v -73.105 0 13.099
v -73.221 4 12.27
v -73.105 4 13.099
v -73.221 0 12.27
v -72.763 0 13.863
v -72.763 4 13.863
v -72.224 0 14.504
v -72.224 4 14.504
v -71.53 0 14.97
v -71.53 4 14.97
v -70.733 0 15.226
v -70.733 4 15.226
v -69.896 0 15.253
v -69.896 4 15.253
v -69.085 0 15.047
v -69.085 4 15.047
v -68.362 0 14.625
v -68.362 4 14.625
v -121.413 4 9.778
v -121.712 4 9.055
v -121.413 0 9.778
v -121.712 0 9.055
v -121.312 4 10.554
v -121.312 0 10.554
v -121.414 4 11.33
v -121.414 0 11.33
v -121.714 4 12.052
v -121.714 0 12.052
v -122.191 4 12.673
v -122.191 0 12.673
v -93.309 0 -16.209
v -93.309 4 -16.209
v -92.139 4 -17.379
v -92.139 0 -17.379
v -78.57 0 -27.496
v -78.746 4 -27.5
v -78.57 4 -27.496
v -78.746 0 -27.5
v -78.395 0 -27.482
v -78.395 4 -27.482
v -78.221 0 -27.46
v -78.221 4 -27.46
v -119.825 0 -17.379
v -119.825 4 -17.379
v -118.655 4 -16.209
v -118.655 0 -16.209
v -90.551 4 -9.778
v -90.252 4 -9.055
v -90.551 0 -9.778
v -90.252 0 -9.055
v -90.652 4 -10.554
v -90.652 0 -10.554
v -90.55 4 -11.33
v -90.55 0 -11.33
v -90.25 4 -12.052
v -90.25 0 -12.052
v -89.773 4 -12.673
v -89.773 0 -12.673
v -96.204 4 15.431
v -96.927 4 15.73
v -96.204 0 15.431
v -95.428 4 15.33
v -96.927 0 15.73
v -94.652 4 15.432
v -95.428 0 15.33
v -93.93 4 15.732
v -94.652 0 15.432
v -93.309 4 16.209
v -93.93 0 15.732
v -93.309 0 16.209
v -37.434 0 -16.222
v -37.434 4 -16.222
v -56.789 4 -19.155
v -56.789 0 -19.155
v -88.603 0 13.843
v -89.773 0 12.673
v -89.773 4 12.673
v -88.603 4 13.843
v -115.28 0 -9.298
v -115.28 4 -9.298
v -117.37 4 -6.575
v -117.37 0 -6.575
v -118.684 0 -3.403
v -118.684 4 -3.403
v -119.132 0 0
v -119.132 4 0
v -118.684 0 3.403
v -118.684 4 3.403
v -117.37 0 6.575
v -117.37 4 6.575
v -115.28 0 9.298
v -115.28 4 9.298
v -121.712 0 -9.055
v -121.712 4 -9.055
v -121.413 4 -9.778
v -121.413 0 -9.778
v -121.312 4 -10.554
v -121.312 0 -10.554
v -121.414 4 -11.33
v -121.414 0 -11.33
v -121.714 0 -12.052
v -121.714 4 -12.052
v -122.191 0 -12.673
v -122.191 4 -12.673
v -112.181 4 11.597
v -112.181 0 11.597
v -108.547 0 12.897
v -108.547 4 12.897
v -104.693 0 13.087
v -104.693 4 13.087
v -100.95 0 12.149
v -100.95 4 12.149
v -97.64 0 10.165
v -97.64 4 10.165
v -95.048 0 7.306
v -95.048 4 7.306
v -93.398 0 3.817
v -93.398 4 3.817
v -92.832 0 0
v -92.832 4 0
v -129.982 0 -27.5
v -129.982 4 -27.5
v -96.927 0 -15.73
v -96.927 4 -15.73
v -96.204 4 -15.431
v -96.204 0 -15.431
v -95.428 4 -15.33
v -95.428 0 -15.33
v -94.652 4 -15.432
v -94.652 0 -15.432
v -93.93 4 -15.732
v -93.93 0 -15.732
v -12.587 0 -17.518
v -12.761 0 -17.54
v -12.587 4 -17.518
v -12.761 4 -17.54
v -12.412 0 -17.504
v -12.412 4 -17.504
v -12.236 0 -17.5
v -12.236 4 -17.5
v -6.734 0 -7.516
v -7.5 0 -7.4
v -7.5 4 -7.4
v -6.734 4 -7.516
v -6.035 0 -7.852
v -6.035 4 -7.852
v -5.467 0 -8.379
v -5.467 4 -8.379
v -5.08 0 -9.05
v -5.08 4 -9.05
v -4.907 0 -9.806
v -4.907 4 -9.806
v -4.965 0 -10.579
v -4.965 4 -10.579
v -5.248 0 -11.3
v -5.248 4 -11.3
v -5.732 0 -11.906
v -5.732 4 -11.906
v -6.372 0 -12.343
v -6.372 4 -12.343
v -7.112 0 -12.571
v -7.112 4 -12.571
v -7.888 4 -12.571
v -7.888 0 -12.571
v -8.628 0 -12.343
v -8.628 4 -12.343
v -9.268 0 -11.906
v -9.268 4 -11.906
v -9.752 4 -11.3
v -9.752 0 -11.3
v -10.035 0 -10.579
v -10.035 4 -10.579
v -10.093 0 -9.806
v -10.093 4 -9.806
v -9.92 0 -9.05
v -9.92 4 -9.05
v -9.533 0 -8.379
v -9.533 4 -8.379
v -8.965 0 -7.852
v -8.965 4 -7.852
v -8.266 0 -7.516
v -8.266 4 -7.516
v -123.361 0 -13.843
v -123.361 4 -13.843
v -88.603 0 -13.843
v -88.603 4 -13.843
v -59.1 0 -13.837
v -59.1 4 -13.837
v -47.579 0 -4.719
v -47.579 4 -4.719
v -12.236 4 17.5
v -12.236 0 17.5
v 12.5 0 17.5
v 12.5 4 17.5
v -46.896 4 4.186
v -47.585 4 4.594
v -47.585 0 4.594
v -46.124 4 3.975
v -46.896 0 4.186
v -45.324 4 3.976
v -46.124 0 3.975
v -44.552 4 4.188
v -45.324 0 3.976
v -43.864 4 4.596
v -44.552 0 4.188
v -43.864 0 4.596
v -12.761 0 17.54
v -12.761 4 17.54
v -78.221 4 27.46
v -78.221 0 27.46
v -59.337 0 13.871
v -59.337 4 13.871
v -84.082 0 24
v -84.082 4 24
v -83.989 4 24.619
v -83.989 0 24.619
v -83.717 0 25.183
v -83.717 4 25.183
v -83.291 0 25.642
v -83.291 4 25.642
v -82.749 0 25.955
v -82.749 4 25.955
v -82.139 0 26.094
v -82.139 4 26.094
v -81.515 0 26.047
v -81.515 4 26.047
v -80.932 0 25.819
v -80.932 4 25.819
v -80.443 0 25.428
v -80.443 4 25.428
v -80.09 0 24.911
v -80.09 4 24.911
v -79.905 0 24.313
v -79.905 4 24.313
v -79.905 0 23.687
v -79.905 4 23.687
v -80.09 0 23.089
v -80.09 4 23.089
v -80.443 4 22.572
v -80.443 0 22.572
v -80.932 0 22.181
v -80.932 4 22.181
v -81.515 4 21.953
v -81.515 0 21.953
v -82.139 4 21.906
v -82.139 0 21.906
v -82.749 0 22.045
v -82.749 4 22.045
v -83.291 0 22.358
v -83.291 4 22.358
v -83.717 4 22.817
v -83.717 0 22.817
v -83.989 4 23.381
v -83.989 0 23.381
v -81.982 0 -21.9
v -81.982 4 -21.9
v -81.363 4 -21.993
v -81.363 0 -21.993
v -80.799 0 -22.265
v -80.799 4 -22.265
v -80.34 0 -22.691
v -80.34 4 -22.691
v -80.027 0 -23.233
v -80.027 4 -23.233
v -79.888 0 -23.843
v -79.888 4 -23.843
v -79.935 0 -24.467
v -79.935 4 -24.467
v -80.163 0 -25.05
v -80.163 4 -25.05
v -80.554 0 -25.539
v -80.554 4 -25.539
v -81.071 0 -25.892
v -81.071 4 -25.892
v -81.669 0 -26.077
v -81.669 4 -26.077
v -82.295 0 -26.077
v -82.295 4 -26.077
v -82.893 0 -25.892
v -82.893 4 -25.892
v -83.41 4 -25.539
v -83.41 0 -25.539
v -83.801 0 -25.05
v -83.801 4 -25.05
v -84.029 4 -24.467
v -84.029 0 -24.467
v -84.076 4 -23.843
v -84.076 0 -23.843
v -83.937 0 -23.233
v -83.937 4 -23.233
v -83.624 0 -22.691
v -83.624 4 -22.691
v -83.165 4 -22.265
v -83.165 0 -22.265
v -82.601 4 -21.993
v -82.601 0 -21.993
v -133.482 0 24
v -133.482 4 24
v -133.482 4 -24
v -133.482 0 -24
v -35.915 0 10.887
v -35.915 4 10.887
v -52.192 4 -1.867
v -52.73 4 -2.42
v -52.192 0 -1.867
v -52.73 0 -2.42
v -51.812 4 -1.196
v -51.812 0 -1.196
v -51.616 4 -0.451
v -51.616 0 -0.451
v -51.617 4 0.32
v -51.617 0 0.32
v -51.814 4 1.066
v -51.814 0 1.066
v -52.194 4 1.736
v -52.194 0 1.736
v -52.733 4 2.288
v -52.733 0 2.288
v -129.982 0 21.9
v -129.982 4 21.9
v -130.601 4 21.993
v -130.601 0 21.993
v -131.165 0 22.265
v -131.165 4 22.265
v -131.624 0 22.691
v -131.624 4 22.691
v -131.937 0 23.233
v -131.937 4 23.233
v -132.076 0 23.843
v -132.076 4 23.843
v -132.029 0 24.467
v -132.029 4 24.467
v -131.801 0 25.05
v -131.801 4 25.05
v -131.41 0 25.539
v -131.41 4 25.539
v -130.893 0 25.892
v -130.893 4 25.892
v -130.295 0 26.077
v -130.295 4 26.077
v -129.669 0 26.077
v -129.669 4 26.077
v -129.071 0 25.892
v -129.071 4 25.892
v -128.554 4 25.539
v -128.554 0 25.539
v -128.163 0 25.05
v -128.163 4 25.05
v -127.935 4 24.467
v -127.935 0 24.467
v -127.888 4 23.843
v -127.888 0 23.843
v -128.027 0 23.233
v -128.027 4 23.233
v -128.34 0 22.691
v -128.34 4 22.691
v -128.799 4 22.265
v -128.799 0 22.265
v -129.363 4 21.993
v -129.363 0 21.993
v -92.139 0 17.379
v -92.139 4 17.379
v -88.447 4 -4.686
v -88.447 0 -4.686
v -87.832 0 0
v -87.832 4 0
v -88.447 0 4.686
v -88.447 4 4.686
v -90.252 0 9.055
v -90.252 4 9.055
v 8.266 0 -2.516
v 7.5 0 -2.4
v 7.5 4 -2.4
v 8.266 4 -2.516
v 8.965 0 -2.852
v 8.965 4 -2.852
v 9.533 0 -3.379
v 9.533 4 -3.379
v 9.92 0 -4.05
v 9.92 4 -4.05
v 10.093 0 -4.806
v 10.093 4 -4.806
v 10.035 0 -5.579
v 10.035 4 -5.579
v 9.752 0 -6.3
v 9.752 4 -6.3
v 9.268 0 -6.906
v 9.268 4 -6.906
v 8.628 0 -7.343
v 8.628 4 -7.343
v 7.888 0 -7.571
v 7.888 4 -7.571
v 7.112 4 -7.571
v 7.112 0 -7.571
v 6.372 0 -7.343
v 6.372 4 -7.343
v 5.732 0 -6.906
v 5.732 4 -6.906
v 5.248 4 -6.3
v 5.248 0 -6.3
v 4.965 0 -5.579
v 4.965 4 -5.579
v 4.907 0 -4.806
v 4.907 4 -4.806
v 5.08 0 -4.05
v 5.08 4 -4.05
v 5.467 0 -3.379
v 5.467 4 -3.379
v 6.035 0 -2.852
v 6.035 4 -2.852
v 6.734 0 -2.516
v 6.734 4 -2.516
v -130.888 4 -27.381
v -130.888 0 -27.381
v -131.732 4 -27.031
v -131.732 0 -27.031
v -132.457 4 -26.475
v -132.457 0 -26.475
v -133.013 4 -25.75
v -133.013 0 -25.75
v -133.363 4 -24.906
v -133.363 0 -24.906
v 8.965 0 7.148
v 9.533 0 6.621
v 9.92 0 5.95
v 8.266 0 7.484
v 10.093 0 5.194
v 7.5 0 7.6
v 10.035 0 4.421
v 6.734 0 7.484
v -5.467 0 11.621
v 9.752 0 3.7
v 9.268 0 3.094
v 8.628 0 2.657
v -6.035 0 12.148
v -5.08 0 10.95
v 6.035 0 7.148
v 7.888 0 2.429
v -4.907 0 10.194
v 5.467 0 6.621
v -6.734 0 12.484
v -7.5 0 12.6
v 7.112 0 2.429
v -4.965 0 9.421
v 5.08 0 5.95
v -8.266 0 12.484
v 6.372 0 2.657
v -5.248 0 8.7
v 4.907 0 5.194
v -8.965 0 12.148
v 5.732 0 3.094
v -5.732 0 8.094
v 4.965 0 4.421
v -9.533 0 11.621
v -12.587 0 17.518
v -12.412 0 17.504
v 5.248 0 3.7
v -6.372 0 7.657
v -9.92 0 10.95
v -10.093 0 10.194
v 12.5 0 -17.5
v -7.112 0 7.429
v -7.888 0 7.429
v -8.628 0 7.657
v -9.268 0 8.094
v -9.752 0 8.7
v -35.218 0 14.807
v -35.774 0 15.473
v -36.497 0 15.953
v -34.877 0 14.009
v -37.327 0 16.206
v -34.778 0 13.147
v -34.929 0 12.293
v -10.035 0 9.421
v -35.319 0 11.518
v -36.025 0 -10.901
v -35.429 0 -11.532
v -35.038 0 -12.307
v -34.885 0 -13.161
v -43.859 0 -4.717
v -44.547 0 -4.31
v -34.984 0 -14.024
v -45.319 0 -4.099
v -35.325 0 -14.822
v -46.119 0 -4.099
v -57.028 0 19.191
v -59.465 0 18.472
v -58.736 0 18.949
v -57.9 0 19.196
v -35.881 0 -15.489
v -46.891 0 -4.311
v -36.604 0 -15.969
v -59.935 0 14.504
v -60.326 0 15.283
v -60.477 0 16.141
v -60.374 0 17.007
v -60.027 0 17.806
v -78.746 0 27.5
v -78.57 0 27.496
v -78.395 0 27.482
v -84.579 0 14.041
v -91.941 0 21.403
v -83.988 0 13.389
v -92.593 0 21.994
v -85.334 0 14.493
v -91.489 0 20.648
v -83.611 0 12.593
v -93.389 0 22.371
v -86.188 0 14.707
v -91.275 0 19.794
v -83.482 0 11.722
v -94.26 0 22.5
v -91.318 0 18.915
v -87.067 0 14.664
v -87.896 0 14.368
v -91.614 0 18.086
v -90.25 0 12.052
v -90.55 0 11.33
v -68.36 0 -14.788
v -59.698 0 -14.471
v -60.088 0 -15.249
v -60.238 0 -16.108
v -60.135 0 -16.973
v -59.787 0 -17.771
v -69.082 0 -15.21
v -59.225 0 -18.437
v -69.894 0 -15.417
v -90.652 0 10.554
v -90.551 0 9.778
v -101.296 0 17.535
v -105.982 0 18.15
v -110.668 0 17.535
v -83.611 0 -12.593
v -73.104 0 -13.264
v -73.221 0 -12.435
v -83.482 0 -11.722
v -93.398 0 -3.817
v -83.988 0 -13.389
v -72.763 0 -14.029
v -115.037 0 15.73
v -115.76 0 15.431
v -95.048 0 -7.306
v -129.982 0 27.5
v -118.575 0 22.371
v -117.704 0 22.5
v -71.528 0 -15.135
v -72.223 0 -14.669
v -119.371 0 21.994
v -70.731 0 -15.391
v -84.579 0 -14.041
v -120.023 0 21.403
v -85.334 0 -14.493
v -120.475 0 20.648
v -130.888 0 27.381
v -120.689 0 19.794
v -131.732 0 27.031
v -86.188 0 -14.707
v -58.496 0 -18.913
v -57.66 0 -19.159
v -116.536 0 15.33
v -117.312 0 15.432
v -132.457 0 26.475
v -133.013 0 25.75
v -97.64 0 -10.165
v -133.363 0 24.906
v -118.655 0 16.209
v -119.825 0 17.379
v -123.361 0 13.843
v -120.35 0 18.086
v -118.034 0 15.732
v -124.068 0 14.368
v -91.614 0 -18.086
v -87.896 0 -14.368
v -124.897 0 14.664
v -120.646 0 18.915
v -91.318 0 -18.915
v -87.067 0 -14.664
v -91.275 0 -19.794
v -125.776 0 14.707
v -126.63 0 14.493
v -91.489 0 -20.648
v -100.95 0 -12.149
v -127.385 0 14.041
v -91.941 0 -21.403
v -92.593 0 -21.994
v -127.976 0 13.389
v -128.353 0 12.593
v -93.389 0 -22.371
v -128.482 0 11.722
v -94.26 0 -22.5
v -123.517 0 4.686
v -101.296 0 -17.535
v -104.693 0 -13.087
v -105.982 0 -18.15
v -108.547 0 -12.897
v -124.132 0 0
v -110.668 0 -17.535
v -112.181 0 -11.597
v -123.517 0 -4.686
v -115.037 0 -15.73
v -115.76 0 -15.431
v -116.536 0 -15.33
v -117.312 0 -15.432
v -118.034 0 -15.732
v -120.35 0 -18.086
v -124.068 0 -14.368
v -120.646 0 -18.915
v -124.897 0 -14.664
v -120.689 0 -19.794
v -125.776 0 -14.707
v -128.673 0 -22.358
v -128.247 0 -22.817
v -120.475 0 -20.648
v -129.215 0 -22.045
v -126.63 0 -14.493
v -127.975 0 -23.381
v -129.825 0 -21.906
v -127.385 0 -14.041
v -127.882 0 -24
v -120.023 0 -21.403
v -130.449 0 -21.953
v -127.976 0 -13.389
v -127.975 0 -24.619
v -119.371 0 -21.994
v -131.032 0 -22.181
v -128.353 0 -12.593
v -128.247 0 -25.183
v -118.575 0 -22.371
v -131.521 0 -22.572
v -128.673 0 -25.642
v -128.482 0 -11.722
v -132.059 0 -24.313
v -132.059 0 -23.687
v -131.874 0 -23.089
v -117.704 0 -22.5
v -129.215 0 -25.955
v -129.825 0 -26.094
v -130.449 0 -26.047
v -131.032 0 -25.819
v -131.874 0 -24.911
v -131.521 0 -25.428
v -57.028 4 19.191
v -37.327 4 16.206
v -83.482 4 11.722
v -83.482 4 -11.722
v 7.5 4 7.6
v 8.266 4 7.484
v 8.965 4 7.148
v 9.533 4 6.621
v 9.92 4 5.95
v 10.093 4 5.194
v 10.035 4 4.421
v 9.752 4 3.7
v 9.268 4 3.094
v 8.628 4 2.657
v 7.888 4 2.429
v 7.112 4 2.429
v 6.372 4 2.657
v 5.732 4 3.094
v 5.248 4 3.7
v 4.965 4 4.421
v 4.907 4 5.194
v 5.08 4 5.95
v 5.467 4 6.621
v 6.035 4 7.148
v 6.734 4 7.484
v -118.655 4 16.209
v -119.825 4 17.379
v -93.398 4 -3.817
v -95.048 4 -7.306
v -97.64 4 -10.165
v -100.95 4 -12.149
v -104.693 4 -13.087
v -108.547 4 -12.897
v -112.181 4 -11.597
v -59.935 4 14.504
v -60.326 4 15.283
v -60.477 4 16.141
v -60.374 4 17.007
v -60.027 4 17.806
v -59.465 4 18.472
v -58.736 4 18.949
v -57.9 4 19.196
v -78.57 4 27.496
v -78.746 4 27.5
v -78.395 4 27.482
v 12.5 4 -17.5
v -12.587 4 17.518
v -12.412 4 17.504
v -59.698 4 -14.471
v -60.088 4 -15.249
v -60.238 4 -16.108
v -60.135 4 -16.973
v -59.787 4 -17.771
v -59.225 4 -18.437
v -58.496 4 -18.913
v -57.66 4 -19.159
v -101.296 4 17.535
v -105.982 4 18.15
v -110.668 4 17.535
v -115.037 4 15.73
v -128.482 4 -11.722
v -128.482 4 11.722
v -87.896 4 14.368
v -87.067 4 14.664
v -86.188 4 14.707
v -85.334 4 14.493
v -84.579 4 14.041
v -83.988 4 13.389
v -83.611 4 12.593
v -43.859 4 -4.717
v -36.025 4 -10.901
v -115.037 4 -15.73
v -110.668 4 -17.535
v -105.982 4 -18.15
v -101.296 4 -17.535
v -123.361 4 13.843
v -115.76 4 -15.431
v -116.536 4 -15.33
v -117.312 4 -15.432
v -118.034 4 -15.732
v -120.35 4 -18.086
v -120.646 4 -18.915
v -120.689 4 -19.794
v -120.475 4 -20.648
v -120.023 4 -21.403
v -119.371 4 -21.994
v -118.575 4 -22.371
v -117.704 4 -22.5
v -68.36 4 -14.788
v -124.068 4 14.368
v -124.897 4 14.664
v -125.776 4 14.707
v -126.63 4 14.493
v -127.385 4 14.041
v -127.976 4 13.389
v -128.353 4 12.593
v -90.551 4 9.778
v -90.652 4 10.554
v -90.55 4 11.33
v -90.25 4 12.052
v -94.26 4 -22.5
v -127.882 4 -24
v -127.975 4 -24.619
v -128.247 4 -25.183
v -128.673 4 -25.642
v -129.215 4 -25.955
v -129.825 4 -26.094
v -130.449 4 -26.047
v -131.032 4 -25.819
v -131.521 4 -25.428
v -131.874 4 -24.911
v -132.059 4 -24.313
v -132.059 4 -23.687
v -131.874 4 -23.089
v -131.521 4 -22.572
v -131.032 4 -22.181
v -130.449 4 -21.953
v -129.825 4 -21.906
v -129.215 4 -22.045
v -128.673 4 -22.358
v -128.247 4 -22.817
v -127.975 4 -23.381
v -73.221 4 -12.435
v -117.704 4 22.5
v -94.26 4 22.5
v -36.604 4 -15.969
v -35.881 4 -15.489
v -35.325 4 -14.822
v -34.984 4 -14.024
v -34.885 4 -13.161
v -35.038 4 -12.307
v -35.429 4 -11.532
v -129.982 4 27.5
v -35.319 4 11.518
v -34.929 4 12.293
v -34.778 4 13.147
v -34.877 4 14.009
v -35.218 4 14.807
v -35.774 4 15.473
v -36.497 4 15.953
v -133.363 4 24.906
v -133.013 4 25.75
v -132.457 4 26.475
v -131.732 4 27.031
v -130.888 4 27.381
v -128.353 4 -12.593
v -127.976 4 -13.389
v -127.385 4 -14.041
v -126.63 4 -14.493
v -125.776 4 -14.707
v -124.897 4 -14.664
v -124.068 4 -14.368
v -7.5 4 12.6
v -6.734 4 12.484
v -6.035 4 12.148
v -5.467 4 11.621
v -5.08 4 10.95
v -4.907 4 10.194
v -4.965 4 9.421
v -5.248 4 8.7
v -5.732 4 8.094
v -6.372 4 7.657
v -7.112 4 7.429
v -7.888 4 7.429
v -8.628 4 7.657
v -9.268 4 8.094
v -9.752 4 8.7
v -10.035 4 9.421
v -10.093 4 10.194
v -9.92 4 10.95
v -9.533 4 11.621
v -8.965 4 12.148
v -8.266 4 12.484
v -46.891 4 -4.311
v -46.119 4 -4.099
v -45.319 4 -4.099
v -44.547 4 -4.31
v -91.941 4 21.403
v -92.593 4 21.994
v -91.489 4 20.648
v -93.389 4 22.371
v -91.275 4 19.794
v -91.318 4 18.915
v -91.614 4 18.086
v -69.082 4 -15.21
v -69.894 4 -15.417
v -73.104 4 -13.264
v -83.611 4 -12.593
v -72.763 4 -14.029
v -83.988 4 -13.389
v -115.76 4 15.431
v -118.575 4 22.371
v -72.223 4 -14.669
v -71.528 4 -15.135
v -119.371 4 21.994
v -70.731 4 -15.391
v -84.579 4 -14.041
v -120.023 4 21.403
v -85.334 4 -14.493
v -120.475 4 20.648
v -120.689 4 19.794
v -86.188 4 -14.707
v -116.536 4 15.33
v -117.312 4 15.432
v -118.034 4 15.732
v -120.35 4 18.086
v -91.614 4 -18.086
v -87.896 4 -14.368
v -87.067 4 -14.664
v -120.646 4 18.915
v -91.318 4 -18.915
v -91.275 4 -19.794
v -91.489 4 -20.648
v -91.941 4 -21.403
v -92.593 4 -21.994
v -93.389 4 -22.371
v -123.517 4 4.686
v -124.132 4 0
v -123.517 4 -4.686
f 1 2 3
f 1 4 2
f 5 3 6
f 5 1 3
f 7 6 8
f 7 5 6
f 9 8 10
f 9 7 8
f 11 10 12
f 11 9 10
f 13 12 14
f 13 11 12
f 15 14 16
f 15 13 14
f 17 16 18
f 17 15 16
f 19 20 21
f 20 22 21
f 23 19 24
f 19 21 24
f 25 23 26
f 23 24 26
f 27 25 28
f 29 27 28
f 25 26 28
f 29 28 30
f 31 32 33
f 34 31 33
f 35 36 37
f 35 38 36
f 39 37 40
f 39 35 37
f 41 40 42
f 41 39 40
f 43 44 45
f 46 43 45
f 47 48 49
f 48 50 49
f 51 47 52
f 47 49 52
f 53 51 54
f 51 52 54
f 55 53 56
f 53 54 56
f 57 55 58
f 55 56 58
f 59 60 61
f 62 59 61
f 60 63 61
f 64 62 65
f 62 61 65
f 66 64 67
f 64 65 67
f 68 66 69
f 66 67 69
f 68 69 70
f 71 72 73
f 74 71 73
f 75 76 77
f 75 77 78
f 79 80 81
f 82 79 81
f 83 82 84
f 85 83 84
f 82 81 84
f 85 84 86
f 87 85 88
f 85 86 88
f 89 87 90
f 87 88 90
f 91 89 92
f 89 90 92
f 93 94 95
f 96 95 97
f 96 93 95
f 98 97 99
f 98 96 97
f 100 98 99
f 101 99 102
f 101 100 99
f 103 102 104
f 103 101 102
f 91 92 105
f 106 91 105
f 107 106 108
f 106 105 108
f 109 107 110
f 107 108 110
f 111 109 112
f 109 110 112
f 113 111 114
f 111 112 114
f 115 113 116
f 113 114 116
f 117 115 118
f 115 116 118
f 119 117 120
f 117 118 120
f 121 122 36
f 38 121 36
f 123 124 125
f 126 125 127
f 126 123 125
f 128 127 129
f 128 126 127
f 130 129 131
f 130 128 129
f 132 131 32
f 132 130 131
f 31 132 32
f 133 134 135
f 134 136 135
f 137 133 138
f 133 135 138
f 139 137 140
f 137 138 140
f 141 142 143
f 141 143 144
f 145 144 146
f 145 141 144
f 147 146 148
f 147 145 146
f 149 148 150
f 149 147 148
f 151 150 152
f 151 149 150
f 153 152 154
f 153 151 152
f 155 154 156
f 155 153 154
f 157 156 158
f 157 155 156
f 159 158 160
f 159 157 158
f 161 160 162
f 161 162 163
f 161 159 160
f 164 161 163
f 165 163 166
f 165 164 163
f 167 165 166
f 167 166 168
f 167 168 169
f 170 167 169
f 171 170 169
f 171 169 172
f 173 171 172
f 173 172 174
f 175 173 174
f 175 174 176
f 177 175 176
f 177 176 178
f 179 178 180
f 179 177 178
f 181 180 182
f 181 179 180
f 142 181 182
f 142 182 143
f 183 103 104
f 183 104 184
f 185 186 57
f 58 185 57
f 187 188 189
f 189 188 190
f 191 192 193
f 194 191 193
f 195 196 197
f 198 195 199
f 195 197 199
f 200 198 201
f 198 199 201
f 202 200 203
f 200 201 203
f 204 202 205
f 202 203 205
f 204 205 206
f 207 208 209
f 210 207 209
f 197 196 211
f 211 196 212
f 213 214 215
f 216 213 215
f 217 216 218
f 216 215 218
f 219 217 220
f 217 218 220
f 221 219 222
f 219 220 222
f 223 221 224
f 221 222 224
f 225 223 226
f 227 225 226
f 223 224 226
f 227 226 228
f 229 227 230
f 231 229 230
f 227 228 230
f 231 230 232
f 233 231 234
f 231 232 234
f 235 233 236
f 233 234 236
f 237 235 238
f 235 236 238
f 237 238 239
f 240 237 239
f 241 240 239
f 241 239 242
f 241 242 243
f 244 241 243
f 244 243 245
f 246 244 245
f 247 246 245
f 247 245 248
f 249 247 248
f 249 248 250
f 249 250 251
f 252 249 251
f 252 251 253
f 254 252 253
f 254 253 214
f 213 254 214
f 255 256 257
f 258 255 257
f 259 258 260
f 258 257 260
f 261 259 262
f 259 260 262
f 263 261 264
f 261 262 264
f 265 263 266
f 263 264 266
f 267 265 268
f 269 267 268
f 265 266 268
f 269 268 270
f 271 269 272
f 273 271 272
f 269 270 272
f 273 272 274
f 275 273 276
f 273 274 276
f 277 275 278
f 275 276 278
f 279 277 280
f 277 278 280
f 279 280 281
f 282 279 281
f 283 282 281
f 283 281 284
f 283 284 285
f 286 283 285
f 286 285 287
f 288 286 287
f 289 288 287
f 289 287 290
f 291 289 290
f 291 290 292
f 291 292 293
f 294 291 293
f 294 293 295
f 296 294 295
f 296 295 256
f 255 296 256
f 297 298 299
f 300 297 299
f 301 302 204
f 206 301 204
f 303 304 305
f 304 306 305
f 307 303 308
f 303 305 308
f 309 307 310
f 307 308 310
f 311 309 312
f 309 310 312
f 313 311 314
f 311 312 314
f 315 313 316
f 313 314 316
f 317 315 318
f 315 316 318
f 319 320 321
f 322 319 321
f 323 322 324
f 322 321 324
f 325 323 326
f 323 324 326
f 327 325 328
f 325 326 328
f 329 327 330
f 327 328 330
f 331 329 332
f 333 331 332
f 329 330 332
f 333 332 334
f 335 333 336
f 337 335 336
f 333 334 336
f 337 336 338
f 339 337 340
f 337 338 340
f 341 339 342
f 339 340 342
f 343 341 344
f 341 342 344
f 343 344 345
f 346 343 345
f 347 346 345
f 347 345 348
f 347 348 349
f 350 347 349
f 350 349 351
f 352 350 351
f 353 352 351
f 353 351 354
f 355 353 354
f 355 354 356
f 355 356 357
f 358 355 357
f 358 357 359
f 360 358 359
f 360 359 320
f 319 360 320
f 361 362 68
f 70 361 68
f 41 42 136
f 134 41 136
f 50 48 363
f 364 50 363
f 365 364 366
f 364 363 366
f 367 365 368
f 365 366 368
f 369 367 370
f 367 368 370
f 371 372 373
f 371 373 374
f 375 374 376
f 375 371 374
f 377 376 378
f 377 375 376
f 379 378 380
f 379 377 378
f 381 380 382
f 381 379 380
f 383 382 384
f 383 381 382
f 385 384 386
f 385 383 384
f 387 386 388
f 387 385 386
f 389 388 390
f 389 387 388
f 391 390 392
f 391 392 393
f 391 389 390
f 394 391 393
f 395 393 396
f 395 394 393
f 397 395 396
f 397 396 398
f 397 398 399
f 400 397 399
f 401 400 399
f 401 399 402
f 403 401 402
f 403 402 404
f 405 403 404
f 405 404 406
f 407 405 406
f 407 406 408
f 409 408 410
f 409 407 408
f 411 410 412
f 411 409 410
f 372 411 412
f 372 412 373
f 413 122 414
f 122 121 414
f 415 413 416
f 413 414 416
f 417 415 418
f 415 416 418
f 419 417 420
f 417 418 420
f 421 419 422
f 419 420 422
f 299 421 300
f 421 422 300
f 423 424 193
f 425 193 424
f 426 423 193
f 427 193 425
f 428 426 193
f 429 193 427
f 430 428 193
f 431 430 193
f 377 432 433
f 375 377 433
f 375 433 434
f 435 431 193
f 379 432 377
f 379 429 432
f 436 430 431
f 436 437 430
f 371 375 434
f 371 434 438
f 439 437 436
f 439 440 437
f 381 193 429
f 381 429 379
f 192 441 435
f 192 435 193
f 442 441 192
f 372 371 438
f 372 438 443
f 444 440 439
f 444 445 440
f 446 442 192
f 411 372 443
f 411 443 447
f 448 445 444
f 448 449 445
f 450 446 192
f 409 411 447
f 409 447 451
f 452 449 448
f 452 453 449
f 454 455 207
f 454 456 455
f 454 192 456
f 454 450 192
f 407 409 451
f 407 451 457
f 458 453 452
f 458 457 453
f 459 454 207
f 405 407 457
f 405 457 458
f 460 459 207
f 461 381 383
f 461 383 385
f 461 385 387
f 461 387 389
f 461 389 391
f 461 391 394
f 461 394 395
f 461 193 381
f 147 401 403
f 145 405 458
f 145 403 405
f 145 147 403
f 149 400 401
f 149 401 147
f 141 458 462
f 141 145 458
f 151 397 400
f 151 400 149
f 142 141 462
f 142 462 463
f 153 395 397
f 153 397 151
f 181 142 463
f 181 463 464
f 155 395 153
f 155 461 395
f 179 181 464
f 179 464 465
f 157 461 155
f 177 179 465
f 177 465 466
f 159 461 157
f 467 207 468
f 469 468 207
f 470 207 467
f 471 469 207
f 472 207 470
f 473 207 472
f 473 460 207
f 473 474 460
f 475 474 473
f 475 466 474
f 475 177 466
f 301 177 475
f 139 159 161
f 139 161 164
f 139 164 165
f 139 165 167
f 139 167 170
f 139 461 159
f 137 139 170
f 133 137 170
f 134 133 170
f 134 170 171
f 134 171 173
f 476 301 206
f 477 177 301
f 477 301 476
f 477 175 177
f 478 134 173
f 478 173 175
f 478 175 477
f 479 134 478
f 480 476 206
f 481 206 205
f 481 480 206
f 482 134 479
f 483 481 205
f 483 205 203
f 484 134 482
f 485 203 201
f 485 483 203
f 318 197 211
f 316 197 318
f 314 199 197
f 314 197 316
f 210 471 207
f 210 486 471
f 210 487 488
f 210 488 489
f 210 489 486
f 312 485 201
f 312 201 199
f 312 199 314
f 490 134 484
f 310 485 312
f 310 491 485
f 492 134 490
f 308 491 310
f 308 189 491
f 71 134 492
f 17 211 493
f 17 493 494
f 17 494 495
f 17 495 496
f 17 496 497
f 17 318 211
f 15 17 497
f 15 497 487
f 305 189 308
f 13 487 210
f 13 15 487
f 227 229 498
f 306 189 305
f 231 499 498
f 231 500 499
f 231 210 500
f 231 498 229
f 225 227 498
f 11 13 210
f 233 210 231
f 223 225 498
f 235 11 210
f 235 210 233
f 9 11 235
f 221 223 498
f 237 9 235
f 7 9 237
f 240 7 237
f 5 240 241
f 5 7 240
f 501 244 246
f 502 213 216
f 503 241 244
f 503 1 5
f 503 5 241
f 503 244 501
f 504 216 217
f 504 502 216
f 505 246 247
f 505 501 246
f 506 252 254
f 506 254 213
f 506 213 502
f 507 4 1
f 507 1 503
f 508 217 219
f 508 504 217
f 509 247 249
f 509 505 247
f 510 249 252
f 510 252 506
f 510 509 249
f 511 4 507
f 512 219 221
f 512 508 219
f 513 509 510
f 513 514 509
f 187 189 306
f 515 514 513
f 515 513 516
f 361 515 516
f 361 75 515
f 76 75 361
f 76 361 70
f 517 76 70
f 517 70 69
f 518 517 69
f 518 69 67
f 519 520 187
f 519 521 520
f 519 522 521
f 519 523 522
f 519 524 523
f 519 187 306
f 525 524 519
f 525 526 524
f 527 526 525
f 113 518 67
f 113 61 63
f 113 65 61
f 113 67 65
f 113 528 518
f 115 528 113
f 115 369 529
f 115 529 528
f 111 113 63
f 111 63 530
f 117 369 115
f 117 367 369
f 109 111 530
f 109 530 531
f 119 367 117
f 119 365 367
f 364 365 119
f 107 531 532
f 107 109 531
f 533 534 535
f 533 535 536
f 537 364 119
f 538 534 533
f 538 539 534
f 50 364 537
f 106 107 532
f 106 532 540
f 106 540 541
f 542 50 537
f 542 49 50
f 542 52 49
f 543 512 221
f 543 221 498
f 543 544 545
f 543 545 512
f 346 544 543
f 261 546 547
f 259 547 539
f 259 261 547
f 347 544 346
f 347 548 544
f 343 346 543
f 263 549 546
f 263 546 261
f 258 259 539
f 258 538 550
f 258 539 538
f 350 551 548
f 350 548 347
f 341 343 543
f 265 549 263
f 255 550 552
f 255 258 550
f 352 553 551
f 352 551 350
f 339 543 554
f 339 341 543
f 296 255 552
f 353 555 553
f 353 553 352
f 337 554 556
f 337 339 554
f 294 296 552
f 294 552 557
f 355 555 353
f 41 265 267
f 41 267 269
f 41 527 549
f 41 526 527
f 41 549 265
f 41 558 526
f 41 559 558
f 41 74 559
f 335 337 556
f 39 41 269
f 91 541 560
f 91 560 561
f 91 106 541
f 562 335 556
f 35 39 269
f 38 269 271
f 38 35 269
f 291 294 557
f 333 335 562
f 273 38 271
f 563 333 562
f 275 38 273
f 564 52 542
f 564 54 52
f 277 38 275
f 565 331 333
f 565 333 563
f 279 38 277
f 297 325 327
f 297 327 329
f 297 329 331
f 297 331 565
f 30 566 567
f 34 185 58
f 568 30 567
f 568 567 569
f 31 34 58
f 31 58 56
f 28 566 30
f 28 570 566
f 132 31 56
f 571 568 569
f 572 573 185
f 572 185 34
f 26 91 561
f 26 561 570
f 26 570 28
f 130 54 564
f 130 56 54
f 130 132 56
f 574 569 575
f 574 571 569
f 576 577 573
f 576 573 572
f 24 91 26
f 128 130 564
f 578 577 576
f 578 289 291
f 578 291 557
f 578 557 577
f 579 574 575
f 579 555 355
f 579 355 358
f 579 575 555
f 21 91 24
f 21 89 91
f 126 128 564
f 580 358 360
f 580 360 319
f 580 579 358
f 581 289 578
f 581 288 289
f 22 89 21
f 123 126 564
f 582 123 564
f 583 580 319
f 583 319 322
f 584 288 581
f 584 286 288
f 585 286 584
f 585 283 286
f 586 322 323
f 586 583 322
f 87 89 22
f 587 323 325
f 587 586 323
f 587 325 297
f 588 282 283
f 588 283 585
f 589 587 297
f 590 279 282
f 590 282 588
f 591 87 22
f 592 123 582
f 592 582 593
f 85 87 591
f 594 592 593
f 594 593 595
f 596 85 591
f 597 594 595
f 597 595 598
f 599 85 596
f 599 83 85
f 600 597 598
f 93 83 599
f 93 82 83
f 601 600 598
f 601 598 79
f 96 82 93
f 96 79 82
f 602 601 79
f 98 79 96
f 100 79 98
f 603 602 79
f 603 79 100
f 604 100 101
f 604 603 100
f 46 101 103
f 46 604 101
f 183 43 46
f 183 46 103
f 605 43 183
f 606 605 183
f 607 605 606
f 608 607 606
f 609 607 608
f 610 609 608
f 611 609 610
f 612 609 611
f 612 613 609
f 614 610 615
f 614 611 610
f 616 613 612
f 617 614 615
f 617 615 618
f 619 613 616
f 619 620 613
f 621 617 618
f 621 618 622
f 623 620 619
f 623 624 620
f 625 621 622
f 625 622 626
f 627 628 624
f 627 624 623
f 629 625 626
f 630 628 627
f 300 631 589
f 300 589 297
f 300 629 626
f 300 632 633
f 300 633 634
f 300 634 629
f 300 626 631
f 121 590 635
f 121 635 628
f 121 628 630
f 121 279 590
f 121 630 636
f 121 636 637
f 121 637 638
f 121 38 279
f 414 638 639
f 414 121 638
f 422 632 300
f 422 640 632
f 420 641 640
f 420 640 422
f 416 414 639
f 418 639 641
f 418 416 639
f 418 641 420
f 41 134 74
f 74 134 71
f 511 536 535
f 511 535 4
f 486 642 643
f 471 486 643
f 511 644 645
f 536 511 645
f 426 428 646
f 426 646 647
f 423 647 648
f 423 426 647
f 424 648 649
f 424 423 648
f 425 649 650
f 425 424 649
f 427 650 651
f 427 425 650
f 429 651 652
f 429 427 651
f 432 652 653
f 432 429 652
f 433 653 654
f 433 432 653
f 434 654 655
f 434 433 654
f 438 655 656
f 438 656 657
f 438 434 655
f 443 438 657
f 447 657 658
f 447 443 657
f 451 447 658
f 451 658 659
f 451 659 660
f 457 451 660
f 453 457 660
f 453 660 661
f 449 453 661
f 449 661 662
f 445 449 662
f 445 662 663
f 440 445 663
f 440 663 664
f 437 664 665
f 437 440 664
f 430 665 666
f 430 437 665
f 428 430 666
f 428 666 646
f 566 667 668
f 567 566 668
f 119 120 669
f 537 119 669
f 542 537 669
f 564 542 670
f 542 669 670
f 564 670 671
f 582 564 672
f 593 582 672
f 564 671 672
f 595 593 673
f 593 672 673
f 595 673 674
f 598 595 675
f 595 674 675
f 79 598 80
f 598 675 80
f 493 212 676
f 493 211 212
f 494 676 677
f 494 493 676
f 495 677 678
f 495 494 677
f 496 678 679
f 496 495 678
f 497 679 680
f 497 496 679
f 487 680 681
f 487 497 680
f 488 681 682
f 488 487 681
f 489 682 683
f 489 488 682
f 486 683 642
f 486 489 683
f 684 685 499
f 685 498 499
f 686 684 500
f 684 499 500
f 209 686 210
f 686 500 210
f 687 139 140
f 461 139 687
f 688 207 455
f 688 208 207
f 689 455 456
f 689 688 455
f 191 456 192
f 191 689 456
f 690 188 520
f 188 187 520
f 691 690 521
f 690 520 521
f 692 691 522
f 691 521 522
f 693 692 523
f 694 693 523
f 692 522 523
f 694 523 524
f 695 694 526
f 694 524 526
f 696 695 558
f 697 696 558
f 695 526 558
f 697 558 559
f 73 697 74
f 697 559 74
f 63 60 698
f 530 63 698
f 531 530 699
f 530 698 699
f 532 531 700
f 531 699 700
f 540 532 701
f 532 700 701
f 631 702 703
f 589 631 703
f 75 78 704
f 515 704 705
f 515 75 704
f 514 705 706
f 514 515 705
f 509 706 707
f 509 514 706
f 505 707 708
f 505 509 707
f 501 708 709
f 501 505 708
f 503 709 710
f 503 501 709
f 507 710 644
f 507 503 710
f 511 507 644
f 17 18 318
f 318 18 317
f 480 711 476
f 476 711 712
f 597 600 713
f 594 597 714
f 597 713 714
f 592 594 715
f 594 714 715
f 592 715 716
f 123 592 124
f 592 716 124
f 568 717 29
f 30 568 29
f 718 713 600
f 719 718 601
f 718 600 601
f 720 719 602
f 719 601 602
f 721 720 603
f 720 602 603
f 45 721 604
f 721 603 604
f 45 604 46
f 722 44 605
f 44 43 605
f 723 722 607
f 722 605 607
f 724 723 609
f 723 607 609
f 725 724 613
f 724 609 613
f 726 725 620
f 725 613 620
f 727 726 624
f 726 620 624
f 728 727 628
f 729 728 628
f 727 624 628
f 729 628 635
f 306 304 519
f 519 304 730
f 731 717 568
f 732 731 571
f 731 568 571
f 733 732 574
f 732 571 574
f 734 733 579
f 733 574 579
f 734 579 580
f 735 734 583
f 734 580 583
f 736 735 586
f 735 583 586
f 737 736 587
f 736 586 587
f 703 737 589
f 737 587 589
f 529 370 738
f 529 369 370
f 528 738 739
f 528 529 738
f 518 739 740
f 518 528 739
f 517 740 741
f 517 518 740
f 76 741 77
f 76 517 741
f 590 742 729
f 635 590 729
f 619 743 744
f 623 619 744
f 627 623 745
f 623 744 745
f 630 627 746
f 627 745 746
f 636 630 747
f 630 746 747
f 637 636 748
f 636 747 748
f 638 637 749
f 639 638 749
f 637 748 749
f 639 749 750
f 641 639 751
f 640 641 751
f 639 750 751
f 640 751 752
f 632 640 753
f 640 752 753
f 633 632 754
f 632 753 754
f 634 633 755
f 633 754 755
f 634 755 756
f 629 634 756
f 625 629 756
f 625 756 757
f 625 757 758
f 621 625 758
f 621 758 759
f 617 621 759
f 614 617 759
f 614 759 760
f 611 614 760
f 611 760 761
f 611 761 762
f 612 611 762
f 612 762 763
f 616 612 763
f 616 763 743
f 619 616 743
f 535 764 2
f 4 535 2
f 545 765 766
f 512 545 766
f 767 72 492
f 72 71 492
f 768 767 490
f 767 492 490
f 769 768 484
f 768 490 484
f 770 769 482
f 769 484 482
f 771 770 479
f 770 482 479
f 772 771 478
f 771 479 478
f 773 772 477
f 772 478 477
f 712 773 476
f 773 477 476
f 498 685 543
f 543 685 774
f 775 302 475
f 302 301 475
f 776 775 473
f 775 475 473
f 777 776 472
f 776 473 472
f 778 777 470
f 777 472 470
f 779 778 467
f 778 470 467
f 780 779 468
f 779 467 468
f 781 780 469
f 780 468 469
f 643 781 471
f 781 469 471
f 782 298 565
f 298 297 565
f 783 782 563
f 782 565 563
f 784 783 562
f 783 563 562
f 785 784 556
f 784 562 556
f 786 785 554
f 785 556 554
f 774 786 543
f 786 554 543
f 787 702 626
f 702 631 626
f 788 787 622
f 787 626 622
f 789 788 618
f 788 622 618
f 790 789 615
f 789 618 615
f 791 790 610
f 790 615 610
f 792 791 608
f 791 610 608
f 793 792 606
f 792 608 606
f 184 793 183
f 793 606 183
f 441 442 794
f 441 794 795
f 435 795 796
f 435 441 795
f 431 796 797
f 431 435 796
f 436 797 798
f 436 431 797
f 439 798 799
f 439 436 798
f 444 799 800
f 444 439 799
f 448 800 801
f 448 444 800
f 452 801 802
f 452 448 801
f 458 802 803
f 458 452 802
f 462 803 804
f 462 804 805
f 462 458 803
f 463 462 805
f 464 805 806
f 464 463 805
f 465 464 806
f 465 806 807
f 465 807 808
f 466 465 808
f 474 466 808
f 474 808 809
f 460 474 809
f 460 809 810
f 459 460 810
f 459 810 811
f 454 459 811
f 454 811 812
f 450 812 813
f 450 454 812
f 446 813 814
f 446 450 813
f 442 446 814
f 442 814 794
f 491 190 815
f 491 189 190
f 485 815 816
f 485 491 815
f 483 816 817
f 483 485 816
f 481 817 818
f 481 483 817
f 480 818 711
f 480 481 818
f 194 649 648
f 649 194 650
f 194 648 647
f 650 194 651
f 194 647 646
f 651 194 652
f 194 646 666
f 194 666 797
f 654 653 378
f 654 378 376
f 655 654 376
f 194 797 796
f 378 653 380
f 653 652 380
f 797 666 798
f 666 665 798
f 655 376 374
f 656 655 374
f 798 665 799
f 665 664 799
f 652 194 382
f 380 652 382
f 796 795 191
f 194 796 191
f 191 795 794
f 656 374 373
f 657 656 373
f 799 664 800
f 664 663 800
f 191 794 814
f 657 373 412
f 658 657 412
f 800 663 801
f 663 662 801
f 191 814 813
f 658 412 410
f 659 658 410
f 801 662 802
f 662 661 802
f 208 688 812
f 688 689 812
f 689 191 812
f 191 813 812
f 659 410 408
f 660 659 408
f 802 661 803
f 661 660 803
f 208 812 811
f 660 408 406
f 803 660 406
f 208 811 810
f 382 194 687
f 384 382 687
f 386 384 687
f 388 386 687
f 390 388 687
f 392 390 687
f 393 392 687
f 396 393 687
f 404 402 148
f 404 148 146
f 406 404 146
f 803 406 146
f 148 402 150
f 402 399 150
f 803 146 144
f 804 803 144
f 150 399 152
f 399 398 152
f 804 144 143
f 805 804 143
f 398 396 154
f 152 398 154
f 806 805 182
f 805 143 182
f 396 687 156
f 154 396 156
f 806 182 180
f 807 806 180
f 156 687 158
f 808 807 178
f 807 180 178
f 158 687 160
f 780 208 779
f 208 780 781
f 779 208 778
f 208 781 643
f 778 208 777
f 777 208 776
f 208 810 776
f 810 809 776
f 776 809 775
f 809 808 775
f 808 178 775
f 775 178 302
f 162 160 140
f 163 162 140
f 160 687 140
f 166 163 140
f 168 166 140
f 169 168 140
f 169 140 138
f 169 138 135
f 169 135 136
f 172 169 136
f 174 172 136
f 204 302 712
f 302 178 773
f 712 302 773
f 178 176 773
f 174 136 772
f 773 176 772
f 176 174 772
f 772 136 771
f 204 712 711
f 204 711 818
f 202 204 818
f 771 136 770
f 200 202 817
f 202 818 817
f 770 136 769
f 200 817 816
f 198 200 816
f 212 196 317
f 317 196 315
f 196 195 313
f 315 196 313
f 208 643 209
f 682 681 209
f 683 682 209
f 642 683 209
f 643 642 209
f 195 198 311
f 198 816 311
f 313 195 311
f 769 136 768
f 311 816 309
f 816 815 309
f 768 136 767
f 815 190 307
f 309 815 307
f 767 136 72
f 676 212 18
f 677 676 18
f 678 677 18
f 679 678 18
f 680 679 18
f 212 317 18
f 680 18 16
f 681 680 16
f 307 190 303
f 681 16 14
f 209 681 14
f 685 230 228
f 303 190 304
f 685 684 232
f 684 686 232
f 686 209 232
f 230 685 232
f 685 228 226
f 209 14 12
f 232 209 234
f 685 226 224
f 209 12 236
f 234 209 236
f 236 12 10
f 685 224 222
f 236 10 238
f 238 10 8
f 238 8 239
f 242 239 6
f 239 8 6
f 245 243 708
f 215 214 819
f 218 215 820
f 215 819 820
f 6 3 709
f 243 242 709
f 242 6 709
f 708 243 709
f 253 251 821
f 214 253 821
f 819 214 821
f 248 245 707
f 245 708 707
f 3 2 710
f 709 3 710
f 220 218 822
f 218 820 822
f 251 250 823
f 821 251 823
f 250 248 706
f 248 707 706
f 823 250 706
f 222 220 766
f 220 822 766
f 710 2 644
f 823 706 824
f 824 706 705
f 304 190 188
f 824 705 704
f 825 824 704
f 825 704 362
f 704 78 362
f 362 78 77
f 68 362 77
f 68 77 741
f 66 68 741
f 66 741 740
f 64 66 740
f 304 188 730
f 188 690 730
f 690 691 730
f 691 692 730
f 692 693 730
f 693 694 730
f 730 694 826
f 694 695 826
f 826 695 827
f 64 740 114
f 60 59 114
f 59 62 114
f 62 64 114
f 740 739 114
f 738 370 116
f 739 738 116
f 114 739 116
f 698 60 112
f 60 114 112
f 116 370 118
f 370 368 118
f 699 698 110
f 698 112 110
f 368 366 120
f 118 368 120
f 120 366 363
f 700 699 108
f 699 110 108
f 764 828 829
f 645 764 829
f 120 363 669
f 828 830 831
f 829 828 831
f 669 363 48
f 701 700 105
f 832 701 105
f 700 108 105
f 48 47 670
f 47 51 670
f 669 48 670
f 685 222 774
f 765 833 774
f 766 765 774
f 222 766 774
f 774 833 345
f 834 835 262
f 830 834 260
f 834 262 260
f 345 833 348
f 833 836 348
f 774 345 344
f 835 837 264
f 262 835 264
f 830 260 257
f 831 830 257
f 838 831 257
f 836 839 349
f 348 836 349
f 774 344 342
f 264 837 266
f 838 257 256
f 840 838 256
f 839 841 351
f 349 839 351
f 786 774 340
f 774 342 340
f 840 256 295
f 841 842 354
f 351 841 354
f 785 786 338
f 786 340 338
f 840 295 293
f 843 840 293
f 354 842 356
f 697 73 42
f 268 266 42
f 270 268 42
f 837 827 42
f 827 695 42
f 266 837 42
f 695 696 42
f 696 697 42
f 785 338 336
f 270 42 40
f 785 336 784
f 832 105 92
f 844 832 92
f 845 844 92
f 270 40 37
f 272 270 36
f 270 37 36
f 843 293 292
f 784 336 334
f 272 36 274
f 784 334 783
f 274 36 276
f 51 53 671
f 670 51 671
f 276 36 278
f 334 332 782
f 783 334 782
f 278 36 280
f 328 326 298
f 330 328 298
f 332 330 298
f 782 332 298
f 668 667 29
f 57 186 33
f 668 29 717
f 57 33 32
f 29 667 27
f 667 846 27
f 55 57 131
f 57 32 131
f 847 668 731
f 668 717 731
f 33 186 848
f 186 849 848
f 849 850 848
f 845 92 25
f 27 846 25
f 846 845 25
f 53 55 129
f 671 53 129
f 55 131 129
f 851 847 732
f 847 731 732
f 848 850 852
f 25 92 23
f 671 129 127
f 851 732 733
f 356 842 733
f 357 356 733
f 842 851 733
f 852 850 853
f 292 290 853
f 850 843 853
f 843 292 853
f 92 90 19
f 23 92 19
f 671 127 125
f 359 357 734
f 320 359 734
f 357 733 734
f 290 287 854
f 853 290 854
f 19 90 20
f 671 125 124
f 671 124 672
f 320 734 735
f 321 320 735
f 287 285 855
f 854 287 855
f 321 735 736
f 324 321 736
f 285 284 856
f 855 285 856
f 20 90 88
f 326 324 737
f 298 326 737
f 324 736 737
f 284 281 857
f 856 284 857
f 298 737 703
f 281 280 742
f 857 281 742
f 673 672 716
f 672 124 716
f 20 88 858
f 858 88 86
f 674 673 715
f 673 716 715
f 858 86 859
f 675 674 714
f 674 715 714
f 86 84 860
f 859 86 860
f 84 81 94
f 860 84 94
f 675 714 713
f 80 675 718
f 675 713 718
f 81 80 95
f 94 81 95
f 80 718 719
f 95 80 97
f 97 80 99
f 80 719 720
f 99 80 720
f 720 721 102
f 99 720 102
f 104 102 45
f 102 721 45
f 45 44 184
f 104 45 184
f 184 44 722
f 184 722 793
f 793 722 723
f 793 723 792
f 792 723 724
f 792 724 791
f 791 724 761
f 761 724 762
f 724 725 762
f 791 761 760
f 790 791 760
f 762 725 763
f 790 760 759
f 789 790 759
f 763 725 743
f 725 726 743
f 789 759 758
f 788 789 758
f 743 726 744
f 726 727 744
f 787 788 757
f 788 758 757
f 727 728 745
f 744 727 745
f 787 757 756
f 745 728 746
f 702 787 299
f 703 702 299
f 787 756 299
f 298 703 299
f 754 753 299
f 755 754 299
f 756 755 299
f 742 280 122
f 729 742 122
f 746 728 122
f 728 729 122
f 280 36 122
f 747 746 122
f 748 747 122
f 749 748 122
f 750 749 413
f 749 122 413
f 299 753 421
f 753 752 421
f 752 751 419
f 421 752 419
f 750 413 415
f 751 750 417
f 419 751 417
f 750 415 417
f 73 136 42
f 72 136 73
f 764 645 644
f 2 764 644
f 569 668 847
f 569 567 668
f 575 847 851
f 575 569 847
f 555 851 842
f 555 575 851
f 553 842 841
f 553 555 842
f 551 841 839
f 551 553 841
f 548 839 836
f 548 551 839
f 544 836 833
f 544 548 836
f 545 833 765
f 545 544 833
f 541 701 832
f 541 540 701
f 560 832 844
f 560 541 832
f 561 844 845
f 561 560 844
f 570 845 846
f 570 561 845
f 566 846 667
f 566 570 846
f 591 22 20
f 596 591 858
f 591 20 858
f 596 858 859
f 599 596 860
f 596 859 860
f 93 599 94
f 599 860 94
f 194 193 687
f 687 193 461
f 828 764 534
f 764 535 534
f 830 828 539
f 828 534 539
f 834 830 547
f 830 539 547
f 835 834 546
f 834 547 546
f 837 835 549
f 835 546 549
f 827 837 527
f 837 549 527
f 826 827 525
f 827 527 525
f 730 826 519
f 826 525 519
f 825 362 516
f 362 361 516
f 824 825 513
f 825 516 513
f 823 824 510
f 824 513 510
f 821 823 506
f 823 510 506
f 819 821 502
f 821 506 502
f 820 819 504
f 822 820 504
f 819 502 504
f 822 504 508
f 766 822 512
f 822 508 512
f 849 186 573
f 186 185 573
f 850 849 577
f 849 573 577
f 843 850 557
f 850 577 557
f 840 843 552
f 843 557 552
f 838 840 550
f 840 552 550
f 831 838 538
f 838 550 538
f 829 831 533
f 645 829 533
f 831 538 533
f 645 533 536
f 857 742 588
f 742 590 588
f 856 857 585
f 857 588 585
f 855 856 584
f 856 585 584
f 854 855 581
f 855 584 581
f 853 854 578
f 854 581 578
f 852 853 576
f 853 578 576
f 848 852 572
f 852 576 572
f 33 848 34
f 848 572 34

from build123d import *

# Parameters (mm, degrees)
SKETCH_1_W                       = 25
SKETCH_1_H                       = 35
SKETCH_1_R                       = 2.6
EXTRUDE_1_DEPTH                  = 4
EXTRUDE_2_DEPTH                  = 4
FILLET_1_R                       = 3.5
CUT_EXTRUDE_1_DEPTH              = 10
SKETCH_4_R                       = 2.1
CUT_EXTRUDE_2_DEPTH              = 10
PATTERN_CIRCULAR_1_COUNT         = 4
CUT_EXTRUDE_3_DEPTH              = 10
FILLET_2_R                       = 3
PATTERN_CIRCULAR_2_COUNT         = 4
FILLET_2_OF_PATTERN_CIRCULAR_2_R = 3
CUT_EXTRUDE_4_DEPTH              = 10
FILLET_3_R                       = 3


with BuildPart() as part:
    # 草图1 → 凸台-拉伸1 (new body)
    with BuildSketch(Plane(origin=(0, 0, 0), x_dir=(1, 0, 0), z_dir=(0, 1, 0))):
        Rectangle(SKETCH_1_W, SKETCH_1_H)
        with Locations(Location((7.5, 5, 0), (0, 0, 270))):
            Circle(SKETCH_1_R, mode=Mode.SUBTRACT)
        with Locations(Location((7.5, -5, 0), (0, 0, 270))):
            Circle(SKETCH_1_R, mode=Mode.SUBTRACT)
        with Locations(Location((-7.5, -10, 0), (0, 0, 270))):
            Circle(SKETCH_1_R, mode=Mode.SUBTRACT)
        with Locations(Location((-7.5, 10, 0), (0, 0, 270))):
            Circle(SKETCH_1_R, mode=Mode.SUBTRACT)
    extrude(amount=EXTRUDE_1_DEPTH)


with BuildPart() as body_2:
    # 草图2 → 凸台-拉伸2 (new body)
    with BuildSketch(Plane(origin=(0, 4, 0), x_dir=(1, 0, 0), z_dir=(0, 1, 0))):
        Polygon((-133.482, 27.5), (-78.482, 27.5), (-12.5, 17.5), (-12.5, -17.5), (-78.482, -27.5), (-133.482, -27.5), align=None)
    extrude(amount=-EXTRUDE_2_DEPTH)


with BuildPart() as part_1:
    add(part.part)

    # Combine 1: union body 2
    add(body_2.part)

    # 圆角1
    fillet_1_edges = [part_1.edges().sort_by_distance(p)[0] for p in [
        (-12.5, 2, -17.5),
        (-12.5, 2, 17.5),
        (-78.482, 2, 27.5),
        (-133.482, 2, 27.5),
        (-133.482, 2, -27.5),
        (-78.482, 2, -27.5),
    ]]
    fillet(fillet_1_edges, radius=FILLET_1_R)

    # 草图3 → 切除-拉伸1 (cut)
    with BuildSketch(Plane(origin=(0, 4, 0), x_dir=(1, 0, 0), z_dir=(0, 1, 0))):
        with BuildLine():
            ThreePointArc((-92.832, 0), (-100.949712864, 12.149015853), (-115.280454173, 9.298454173))
            Line((-115.280454173, 9.298454173), (-105.982, 0))
            Line((-105.982, 0), (-115.280454173, -9.298454173))
            ThreePointArc((-115.280454173, -9.298454173), (-100.949712864, -12.149015853), (-92.832, 0))
        make_face()
        with BuildLine():
            Line((-105.982, 0), (-115.280454173, 9.298454173))
            ThreePointArc((-115.280454173, 9.298454173), (-119.132, 0), (-115.280454173, -9.298454173))
            Line((-115.280454173, -9.298454173), (-105.982, 0))
        make_face()
        with BuildLine():
            ThreePointArc((-92.832, 0), (-100.949712864, 12.149015853), (-115.280454173, 9.298454173))
            Line((-115.280454173, 9.298454173), (-105.982, 0))
            Line((-105.982, 0), (-115.280454173, -9.298454173))
            ThreePointArc((-115.280454173, -9.298454173), (-100.949712864, -12.149015853), (-92.832, 0))
        make_face()
        with BuildLine():
            Line((-105.982, 0), (-115.280454173, 9.298454173))
            ThreePointArc((-115.280454173, 9.298454173), (-119.132, 0), (-115.280454173, -9.298454173))
            Line((-115.280454173, -9.298454173), (-105.982, 0))
        make_face()
    extrude(amount=-CUT_EXTRUDE_1_DEPTH, mode=Mode.SUBTRACT)

    # 草图4 → 切除-拉伸2 (cut)
    with BuildSketch(Plane(origin=(0, 4, 0), x_dir=(1, 0, 0), z_dir=(0, 1, 0))):
        with Locations(Location((-81.982, 24, 0), (0, 0, 270))):
            Circle(SKETCH_4_R)
    cut_extrude_2 = extrude(amount=-CUT_EXTRUDE_2_DEPTH, mode=Mode.SUBTRACT)

    # 阵列(圆周)1: 切除-拉伸2 ×4 about axis
    pattern_circular_1_axis = Axis((-105.982, 0, 0), (0, 1, 0))
    for i in range(1, PATTERN_CIRCULAR_1_COUNT):
        add(cut_extrude_2.rotate(pattern_circular_1_axis, i * 360 / PATTERN_CIRCULAR_1_COUNT), mode=Mode.SUBTRACT)

    # 草图5 → 切除-拉伸3 (cut)
    with BuildSketch(Plane(origin=(0, 4, 0), x_dir=(1, 0, 0), z_dir=(0, 1, 0))):
        with BuildLine():
            Line((-120.461424988, 10.943891082), (-128.482, 18.964466094))
            Line((-128.482, 18.964466094), (-128.482, -18.964466094))
            Line((-128.482, -18.964466094), (-120.461424988, -10.943891082))
            ThreePointArc((-120.461424988, -10.943891082), (-124.132, 0), (-120.461424988, 10.943891082))
        make_face()
    cut_extrude_3 = extrude(amount=-CUT_EXTRUDE_3_DEPTH, mode=Mode.SUBTRACT)

    # 圆角2
    fillet_2_edges = [part_1.edges().sort_by_distance(p)[0] for p in [
        (-120.461424988, 2, -10.943891082),
        (-120.461424988, 2, 10.943891082),
        (-128.482, 2, 18.964466094),
        (-128.482, 2, -18.964466094),
    ]]
    fillet(fillet_2_edges, radius=FILLET_2_R)

    # 阵列(圆周)2: 切除-拉伸3 ×4 about axis
    pattern_circular_2_axis = Axis((-105.982, 0, 0), (0, 1, 0))
    for i in range(1, PATTERN_CIRCULAR_2_COUNT):
        add(cut_extrude_3.rotate(pattern_circular_2_axis, i * 360 / PATTERN_CIRCULAR_2_COUNT), mode=Mode.SUBTRACT)

    # 圆角2 of 阵列(圆周)2
    fillet_2_of_pattern_circular_2_edges = [part_1.edges().sort_by_distance(p)[0] for p in [
        (-116.925891082, 2, 14.479424988),
        (-95.038108918, 2, 14.479424988),
        (-87.017533906, 2, 22.5),
        (-124.946466094, 2, 22.5),
        (-91.502575012, 2, 10.943891082),
        (-91.502575012, 2, -10.943891082),
        (-83.482, 2, -18.964466094),
        (-83.482, 2, 18.964466094),
        (-95.038108918, 2, -14.479424988),
        (-116.925891082, 2, -14.479424988),
        (-124.946466094, 2, -22.5),
        (-87.017533906, 2, -22.5),
    ]]
    fillet(fillet_2_of_pattern_circular_2_edges, radius=FILLET_2_OF_PATTERN_CIRCULAR_2_R)

    # 草图6 → 切除-拉伸4 (cut)
    with BuildSketch(Plane(origin=(0, 4, 0), x_dir=(1, 0, 0), z_dir=(0, 1, 0))):
        Polygon((-73.221259435, -18.460580976), (-49.753485721, 0.064081858), (-73.221259435, 18.634602448), align=None)
        Polygon((-45.719729218, 3.248192123), (-30.596936447, 15.18561067), (-67.961344653, 20.848429046), align=None)
        Polygon((-68.227570637, -20.88877732), (-30.500709207, -15.171026808), (-45.723561893, -3.124877792), align=None)
    extrude(amount=-CUT_EXTRUDE_4_DEPTH, mode=Mode.SUBTRACT)

    # 圆角3
    fillet_3_edges = [part_1.edges().sort_by_distance(p)[0] for p in [
        (-30.500709207, 2, 15.171026808),
        (-68.227570637, 2, 20.88877732),
        (-45.723561893, 2, 3.124877792),
        (-45.719729218, 2, -3.248192123),
        (-67.961344653, 2, -20.848429046),
        (-30.596936447, 2, -15.18561067),
        (-73.221259435, 2, 18.460580976),
        (-73.221259435, 2, -18.634602448),
        (-49.753485721, 2, -0.064081858),
    ]]
    fillet(fillet_3_edges, radius=FILLET_3_R)


solid = part_1.part
